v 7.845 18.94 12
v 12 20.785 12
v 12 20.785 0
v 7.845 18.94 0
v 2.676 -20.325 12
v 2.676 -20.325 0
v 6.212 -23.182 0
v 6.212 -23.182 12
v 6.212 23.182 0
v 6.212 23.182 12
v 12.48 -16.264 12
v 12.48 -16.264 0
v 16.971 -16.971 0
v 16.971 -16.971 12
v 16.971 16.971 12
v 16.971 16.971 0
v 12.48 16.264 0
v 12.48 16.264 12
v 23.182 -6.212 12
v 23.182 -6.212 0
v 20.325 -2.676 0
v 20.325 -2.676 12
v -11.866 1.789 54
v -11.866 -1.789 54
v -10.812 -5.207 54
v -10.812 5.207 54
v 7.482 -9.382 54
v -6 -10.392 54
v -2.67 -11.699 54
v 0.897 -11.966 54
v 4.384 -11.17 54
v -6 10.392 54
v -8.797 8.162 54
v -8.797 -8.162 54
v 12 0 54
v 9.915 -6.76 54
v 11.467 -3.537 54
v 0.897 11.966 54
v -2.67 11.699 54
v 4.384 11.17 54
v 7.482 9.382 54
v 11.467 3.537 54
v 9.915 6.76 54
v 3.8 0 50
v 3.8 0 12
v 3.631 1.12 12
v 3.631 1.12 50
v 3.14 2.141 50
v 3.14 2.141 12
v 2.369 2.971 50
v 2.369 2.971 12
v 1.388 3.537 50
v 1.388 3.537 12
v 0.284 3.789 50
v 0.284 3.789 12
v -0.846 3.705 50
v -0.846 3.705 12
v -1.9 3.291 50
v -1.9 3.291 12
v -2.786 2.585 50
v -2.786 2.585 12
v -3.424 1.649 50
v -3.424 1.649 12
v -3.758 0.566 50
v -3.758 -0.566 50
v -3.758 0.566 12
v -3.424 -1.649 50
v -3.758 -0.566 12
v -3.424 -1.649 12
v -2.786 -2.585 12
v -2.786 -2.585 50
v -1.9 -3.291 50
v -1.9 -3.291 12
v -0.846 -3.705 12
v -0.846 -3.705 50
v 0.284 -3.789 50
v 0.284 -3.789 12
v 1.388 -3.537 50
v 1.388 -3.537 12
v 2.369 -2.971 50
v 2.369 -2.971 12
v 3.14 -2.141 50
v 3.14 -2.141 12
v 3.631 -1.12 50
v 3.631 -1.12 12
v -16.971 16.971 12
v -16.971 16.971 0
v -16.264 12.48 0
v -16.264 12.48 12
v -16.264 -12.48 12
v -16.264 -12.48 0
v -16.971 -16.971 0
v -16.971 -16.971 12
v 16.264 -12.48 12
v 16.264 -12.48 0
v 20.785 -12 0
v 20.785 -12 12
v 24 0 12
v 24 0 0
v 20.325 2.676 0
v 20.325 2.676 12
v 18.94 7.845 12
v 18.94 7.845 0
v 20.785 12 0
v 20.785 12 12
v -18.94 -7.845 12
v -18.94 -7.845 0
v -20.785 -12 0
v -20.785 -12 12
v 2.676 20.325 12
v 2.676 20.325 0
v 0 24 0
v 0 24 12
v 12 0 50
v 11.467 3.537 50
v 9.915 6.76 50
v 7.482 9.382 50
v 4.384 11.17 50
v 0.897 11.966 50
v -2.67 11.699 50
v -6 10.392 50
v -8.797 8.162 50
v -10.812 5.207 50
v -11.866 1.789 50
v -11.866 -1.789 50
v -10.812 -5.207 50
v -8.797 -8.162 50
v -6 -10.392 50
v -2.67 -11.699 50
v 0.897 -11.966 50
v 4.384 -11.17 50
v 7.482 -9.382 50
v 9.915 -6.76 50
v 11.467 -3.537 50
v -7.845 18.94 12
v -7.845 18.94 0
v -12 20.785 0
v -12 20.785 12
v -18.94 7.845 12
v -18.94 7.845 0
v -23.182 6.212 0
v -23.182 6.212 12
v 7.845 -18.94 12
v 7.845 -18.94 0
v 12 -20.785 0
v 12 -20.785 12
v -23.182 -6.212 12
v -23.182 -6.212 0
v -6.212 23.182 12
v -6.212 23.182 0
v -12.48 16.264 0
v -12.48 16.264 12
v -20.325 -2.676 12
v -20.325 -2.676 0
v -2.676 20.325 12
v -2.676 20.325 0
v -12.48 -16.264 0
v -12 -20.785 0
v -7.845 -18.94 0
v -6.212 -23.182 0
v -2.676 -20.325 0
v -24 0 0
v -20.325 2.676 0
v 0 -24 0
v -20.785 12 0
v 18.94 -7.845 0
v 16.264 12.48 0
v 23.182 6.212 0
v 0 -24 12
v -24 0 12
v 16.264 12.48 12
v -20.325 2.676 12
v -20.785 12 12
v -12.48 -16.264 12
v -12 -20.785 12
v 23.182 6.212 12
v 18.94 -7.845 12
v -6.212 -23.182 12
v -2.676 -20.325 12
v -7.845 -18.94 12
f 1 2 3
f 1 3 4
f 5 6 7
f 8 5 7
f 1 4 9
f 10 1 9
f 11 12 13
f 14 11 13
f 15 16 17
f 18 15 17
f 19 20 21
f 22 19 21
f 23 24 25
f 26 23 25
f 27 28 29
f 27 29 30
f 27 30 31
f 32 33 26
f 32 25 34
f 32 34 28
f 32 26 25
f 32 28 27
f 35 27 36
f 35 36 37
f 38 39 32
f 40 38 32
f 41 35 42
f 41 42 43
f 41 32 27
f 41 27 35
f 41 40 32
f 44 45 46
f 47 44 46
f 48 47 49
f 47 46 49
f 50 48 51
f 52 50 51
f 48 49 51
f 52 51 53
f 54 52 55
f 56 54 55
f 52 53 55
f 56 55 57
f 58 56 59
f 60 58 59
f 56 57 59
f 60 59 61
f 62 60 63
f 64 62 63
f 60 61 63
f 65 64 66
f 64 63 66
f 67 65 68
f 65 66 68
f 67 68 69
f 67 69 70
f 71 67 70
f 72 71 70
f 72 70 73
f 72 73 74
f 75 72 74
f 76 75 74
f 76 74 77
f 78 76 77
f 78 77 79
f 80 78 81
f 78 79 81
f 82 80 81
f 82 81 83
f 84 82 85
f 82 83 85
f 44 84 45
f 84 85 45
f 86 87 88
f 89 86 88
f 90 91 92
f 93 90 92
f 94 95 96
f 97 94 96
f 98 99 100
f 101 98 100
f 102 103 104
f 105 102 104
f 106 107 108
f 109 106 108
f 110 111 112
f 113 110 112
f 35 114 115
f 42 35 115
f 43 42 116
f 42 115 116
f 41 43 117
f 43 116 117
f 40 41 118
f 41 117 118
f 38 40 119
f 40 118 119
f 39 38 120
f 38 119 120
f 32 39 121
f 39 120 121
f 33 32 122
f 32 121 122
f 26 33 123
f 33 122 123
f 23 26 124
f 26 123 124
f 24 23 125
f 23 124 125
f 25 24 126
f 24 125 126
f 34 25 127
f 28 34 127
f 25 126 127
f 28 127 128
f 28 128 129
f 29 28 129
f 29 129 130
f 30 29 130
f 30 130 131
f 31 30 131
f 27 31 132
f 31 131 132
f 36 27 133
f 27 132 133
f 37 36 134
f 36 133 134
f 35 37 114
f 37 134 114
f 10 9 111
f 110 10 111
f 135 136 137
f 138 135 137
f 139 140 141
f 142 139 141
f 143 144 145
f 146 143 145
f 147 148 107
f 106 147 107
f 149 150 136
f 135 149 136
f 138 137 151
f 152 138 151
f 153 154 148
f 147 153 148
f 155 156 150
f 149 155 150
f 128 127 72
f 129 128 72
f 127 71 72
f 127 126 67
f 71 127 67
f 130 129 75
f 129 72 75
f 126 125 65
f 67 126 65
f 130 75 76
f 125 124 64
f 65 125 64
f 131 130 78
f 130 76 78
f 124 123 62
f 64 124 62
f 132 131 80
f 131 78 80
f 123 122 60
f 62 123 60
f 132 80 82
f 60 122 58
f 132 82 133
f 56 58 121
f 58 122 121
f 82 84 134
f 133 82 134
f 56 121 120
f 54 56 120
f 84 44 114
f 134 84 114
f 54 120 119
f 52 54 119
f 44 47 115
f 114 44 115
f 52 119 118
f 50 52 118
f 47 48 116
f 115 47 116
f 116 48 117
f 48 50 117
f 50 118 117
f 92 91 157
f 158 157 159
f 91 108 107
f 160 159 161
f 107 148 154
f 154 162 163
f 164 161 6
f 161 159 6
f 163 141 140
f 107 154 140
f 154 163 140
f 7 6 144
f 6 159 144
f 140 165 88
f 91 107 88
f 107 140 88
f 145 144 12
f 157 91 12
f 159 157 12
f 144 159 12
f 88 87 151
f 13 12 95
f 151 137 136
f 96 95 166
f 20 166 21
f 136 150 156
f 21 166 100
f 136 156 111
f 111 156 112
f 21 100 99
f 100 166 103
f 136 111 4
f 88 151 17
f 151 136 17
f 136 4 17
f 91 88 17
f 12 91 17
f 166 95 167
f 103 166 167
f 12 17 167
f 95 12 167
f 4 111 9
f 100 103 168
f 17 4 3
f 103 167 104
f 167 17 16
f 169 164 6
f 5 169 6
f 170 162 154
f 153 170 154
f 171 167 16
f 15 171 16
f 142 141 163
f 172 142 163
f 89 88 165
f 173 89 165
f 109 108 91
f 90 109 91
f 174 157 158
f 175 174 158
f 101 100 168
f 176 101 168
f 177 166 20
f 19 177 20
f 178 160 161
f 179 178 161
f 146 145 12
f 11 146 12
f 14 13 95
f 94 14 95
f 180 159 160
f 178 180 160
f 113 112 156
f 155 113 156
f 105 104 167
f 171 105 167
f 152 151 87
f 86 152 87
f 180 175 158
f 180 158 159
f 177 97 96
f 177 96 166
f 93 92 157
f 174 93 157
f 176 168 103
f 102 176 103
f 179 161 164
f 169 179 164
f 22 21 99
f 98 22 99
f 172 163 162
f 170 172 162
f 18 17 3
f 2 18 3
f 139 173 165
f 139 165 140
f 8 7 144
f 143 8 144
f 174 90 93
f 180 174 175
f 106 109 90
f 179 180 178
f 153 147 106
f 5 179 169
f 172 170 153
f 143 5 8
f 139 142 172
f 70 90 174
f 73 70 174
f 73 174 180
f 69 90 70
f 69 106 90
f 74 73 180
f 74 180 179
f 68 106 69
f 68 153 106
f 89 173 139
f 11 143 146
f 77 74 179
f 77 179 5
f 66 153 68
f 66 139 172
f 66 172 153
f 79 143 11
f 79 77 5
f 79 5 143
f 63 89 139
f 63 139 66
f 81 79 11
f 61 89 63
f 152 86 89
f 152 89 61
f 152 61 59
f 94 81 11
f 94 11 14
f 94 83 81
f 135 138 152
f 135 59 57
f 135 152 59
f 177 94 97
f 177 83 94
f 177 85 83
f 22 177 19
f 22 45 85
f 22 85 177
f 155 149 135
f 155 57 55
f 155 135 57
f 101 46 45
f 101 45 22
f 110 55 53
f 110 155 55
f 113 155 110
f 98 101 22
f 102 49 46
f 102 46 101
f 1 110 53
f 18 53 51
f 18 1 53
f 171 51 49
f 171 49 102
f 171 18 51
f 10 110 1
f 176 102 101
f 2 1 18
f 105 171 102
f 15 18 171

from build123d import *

# Parameters (mm, degrees)
PAD_02_GEARLIKE_KNOB_DEPTH       = 12
SKETCH_03_SCREW_SHAFT_PROFILE_R  = 3.8
PAD_04_SCREW_SHAFT_DEPTH         = 38
SKETCH_05_PRESSURE_PAD_PROFILE_R = 12
PAD_06_PRESSURE_PAD_DEPTH        = 4


with BuildPart() as part:
    # Sketch_01_GearLike_Knob_Profile → Pad_02_GearLike_Knob (new body)
    with BuildSketch(Plane.XY):
        Polygon((24, 0), (20.32462, 2.675787), (23.18222, 6.211657), (18.93953, 7.84501), (20.78461, 12), (16.263743, 12.479609), (16.970563, 16.970563), (12.479609, 16.263743), (12, 20.78461), (7.84501, 18.93953), (6.211657, 23.18222), (2.675787, 20.32462), (0, 24), (-2.675787, 20.32462), (-6.211657, 23.18222), (-7.84501, 18.93953), (-12, 20.78461), (-12.479609, 16.263743), (-16.970563, 16.970563), (-16.263743, 12.479609), (-20.78461, 12), (-18.93953, 7.84501), (-23.18222, 6.211657), (-20.32462, 2.675787), (-24, 0), (-20.32462, -2.675787), (-23.18222, -6.211657), (-18.93953, -7.84501), (-20.78461, -12), (-16.263743, -12.479609), (-16.970563, -16.970563), (-12.479609, -16.263743), (-12, -20.78461), (-7.84501, -18.93953), (-6.211657, -23.18222), (-2.675787, -20.32462), (0, -24), (2.675787, -20.32462), (6.211657, -23.18222), (7.84501, -18.93953), (12, -20.78461), (12.479609, -16.263743), (16.970563, -16.970563), (16.263743, -12.479609), (20.78461, -12), (18.93953, -7.84501), (23.18222, -6.211657), (20.32462, -2.675787), align=None)
    extrude(amount=PAD_02_GEARLIKE_KNOB_DEPTH)

    # Sketch_03_Screw_Shaft_Profile → Pad_04_Screw_Shaft (join)
    with BuildSketch(Plane.XY.offset(12)):
        Circle(SKETCH_03_SCREW_SHAFT_PROFILE_R)
    extrude(amount=PAD_04_SCREW_SHAFT_DEPTH)

    # Sketch_05_Pressure_Pad_Profile → Pad_06_Pressure_Pad (join)
    with BuildSketch(Plane.XY.offset(50)):
        Circle(SKETCH_05_PRESSURE_PAD_PROFILE_R)
    extrude(amount=PAD_06_PRESSURE_PAD_DEPTH)


solid = part.part
